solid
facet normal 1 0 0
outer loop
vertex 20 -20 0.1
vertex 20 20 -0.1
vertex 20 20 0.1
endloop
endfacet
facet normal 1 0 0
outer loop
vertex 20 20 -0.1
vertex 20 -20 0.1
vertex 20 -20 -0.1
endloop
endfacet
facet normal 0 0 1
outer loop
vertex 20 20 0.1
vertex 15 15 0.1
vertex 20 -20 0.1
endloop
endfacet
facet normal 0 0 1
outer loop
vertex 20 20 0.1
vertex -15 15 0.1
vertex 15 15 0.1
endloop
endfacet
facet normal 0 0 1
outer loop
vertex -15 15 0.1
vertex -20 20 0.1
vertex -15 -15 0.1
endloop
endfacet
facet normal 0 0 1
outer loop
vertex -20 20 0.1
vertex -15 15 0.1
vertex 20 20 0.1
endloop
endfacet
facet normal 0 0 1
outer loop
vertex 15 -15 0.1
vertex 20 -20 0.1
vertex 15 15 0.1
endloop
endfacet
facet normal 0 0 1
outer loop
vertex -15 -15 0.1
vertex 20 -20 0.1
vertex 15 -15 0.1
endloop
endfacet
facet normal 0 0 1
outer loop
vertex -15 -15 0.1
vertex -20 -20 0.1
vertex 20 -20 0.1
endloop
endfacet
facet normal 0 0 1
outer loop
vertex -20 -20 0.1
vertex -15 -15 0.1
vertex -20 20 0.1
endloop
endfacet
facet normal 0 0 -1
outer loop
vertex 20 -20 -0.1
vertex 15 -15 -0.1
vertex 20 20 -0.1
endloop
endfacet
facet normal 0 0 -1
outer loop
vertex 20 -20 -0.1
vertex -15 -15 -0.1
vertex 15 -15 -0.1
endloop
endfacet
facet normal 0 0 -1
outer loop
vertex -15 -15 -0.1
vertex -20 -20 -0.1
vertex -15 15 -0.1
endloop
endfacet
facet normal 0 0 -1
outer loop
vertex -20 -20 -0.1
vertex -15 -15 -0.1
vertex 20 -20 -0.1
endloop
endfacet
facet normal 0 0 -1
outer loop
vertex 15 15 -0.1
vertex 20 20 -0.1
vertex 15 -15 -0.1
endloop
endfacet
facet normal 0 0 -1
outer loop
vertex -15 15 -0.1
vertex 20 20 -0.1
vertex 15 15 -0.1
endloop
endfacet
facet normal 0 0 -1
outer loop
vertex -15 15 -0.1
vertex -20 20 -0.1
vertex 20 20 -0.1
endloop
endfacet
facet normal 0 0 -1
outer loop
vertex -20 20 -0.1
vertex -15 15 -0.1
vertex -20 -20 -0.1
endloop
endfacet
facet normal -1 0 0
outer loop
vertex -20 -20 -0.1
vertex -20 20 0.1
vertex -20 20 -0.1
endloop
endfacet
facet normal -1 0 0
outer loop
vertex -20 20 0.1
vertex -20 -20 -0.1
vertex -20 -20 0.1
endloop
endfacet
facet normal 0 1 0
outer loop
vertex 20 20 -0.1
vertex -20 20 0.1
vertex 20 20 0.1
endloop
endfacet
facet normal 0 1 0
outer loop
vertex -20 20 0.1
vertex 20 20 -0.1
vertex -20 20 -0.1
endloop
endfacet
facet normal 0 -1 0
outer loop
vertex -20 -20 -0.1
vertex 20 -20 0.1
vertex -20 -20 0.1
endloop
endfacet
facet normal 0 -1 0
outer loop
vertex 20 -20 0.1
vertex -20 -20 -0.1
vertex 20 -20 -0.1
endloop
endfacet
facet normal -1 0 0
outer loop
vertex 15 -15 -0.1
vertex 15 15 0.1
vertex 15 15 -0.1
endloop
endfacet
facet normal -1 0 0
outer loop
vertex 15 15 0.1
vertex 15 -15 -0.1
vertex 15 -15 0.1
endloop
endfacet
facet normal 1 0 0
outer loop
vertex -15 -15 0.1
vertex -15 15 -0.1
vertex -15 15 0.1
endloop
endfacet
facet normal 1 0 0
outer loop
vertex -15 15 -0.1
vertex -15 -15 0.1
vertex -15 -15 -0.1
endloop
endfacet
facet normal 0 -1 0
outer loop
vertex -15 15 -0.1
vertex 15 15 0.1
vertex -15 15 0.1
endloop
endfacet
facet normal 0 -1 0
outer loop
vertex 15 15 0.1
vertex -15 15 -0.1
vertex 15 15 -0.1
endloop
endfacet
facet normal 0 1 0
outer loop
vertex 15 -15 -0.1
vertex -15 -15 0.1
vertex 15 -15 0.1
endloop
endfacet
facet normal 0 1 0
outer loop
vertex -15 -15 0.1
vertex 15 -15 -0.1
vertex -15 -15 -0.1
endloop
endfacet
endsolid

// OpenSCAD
difference()
{
    cube([40,40,0.2],center = true);
    cube([30,30,0.3],center = true);
}
